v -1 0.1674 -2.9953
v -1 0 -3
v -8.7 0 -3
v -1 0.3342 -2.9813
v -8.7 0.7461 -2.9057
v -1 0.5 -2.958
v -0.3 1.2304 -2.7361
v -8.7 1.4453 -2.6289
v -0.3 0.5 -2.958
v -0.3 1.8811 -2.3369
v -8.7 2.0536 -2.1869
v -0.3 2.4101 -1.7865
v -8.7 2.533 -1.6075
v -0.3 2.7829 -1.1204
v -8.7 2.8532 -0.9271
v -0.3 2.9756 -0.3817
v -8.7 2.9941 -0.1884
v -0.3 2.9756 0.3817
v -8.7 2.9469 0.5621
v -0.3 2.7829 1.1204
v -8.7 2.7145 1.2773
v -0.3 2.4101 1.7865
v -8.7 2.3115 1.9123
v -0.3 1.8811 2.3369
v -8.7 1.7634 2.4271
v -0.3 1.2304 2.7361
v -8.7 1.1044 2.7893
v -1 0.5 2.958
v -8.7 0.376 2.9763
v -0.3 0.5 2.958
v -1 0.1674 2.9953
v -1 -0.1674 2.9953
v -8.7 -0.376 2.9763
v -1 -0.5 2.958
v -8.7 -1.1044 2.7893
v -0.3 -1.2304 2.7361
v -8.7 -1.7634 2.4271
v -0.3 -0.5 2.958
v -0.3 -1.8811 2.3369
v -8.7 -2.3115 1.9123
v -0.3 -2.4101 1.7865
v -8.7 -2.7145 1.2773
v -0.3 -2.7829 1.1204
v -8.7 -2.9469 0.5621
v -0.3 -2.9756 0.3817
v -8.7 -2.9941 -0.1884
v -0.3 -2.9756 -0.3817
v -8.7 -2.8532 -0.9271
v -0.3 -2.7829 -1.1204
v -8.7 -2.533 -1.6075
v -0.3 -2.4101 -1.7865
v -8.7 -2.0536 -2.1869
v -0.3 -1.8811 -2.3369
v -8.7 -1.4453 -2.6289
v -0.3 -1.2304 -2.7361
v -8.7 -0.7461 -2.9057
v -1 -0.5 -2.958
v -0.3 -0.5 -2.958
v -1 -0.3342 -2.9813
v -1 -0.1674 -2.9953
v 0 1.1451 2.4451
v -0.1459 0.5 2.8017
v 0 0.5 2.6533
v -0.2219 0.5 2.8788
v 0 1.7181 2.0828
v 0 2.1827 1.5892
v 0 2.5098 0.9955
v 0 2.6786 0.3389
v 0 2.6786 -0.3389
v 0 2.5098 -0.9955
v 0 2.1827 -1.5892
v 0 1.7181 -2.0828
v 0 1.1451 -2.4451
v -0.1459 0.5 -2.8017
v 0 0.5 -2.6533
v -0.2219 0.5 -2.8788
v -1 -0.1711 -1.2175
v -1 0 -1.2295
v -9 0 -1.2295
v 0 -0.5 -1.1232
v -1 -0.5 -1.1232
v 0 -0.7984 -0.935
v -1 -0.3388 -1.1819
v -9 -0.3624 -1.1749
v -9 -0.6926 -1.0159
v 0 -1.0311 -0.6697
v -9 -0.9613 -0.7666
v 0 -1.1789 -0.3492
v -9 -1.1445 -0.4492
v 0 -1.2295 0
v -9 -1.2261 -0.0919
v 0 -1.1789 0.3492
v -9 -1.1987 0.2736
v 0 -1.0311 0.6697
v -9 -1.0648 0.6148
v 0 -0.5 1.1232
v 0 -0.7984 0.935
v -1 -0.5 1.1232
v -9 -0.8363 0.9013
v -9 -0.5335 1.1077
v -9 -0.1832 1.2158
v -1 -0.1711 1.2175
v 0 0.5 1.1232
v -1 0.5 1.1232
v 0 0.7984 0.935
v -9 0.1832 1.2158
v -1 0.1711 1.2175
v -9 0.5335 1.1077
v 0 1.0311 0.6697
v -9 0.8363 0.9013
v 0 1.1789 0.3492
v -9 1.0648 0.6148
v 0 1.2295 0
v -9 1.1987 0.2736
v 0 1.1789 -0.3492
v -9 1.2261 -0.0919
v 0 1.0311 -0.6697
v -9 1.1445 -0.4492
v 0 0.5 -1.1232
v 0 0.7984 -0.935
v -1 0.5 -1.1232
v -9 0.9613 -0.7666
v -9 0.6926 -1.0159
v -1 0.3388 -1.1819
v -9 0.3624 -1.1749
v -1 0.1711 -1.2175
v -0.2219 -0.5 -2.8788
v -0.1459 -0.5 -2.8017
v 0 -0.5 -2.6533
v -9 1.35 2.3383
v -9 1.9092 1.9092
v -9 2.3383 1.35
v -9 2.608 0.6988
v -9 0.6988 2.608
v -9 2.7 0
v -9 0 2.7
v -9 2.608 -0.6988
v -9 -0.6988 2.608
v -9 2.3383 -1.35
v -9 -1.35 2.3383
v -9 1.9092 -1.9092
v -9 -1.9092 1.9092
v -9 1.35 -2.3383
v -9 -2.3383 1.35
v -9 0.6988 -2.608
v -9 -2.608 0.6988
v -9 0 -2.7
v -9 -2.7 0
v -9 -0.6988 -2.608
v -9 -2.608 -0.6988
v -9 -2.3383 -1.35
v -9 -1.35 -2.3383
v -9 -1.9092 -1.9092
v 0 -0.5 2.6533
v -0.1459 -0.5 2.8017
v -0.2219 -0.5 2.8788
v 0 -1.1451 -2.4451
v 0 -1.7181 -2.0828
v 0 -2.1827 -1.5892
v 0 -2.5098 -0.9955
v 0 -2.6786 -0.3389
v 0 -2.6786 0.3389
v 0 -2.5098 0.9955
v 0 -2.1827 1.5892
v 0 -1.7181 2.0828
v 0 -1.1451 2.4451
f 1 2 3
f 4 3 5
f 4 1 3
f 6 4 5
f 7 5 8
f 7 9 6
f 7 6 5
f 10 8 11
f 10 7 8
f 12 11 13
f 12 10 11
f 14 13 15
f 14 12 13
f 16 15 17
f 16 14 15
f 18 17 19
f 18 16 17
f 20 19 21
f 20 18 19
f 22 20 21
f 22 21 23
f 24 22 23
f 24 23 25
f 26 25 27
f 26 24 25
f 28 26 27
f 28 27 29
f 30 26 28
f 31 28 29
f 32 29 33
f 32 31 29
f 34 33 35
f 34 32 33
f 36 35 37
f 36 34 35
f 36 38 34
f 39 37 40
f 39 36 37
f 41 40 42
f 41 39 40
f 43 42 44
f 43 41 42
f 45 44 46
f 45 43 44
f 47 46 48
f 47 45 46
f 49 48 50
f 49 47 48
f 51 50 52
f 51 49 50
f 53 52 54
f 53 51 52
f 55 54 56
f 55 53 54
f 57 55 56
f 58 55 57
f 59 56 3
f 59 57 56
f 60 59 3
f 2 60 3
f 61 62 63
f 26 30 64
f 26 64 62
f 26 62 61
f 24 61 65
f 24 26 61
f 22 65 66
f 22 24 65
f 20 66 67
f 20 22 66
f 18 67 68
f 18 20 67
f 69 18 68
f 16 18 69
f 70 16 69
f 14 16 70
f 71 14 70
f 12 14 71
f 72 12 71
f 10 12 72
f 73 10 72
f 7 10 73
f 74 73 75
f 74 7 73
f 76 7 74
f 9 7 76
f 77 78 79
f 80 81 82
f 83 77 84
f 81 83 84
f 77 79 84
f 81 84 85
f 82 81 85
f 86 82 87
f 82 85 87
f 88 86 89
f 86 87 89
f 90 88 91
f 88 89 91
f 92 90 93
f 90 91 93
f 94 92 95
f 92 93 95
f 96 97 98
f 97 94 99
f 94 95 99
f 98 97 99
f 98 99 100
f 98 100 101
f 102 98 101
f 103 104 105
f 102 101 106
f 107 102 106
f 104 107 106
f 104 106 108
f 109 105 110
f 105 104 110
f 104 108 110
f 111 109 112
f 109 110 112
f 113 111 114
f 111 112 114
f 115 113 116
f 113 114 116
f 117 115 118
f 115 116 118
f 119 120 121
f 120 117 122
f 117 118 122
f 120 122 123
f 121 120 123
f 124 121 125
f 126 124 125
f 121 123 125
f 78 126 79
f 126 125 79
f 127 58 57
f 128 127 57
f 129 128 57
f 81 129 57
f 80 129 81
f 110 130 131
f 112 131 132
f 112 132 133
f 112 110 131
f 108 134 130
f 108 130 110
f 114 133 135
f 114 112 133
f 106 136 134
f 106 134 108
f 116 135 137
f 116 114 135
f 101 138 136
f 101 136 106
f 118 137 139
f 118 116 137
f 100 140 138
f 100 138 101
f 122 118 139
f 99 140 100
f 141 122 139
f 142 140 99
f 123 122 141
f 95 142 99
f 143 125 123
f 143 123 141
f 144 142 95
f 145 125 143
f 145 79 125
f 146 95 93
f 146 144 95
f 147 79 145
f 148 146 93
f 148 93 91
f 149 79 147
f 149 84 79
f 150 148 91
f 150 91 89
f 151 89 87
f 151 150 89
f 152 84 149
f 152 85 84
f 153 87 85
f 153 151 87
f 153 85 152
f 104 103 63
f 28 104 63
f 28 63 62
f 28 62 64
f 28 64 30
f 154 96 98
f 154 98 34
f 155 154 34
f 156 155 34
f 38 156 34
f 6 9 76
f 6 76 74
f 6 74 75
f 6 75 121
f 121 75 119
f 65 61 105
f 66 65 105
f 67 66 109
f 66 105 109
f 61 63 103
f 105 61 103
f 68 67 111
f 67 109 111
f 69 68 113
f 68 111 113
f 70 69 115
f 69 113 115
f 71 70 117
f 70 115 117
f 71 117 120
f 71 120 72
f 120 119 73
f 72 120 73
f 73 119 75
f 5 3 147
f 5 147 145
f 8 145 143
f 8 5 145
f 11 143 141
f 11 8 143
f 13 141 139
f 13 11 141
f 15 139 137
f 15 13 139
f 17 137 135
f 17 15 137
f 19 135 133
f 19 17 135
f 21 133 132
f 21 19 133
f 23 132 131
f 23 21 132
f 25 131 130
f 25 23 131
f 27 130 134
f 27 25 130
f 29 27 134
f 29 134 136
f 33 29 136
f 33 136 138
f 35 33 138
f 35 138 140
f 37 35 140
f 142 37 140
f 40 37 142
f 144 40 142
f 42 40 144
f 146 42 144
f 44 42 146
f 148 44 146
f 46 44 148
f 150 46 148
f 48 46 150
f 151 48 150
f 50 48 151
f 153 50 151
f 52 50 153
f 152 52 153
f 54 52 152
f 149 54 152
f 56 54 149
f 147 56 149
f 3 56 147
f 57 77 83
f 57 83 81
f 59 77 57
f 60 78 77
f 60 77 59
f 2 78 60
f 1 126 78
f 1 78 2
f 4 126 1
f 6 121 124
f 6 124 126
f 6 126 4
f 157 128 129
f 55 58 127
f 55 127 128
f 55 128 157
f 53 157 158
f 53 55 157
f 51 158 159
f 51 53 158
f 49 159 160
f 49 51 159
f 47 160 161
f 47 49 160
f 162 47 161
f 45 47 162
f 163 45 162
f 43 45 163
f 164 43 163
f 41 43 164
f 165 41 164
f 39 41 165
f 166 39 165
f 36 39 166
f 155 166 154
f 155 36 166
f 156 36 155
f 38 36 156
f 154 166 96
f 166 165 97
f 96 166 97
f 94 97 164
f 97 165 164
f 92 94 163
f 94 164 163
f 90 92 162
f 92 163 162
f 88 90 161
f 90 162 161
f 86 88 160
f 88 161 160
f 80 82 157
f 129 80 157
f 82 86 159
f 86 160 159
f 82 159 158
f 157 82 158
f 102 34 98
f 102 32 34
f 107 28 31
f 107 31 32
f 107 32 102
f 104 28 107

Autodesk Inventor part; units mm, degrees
ref_plane "YZ Plane" through (0, 0, 0) normal (1, 0, 0) x (0, 1, 0)
ref_plane "XZ Plane" through (0, 0, 0) normal (0, 1, 0) x (-1, 0, 0)
ref_plane "XY Plane" through (0, 0, 0) normal (0, 0, 1) x (1, 0, 0)
sketch "スケッチ1" plane through (0, 0, 0) normal (0, 1, 0) x (-1, 0, 0)
  line L0 (0, 0) -> (9, 0)
  line L1 (9, 0) -> (9, -3)
  line L2 (9, -3) -> (0, -3)
  line L3 (0, -3) -> (0, 0)
  dimension "d0" = 9
  dimension "d1" = 3
revolve "回転1" add sketch "スケッチ1" angle 360 about axis through (0, 0, 0) along (-1, 0, 0)
sketch "スケッチ2" plane through (0, 0, 0) normal (1, 0, 0) x (0, 0, -1)
  point P0 (0, 0)
  point P1 (0, 0)
hole "穴1" at (0, 0, 0) direction (-1, 0, 0) diameter 2.459 end through all thread size "M3x0.5" class "6H" standard "ANSI Metric M Profile"
sketch "スケッチ3" plane through (0, 0, 0) normal (1, 0, 0) x (0, 0, -1)
  circle A0 centre (0, 0) radius 3 projected
  line L0 (3, 0) -> (-3, 0)
  line L1 (3, -0.5) -> (-3, -0.5)
  line L2 (3, 0.5) -> (-3, 0.5)
  line L3 (3, 0.5) -> (3, -0.5)
  line L4 (-3, 0.5) -> (-3, -0.5)
  point P0 (-2.958, -0.5)
  point P1 (2.958, -0.5)
  point P2 (2.958, 0.5)
  point P3 (-2.958, 0.5)
  dimension "d10" = 0.5
extrude "押し出し1" cut sketch "スケッチ3" against normal blind 1 contours L0 A0 L2 | A0 L1 L0
chamfer "面取り1" distance 0.3 angle 45 3 edges at (-9, 0, 3) (0, 3, 0) (0, -3, 0)
properties part number "ARU-309S" material "ステンレス鋼 AISI 304"
